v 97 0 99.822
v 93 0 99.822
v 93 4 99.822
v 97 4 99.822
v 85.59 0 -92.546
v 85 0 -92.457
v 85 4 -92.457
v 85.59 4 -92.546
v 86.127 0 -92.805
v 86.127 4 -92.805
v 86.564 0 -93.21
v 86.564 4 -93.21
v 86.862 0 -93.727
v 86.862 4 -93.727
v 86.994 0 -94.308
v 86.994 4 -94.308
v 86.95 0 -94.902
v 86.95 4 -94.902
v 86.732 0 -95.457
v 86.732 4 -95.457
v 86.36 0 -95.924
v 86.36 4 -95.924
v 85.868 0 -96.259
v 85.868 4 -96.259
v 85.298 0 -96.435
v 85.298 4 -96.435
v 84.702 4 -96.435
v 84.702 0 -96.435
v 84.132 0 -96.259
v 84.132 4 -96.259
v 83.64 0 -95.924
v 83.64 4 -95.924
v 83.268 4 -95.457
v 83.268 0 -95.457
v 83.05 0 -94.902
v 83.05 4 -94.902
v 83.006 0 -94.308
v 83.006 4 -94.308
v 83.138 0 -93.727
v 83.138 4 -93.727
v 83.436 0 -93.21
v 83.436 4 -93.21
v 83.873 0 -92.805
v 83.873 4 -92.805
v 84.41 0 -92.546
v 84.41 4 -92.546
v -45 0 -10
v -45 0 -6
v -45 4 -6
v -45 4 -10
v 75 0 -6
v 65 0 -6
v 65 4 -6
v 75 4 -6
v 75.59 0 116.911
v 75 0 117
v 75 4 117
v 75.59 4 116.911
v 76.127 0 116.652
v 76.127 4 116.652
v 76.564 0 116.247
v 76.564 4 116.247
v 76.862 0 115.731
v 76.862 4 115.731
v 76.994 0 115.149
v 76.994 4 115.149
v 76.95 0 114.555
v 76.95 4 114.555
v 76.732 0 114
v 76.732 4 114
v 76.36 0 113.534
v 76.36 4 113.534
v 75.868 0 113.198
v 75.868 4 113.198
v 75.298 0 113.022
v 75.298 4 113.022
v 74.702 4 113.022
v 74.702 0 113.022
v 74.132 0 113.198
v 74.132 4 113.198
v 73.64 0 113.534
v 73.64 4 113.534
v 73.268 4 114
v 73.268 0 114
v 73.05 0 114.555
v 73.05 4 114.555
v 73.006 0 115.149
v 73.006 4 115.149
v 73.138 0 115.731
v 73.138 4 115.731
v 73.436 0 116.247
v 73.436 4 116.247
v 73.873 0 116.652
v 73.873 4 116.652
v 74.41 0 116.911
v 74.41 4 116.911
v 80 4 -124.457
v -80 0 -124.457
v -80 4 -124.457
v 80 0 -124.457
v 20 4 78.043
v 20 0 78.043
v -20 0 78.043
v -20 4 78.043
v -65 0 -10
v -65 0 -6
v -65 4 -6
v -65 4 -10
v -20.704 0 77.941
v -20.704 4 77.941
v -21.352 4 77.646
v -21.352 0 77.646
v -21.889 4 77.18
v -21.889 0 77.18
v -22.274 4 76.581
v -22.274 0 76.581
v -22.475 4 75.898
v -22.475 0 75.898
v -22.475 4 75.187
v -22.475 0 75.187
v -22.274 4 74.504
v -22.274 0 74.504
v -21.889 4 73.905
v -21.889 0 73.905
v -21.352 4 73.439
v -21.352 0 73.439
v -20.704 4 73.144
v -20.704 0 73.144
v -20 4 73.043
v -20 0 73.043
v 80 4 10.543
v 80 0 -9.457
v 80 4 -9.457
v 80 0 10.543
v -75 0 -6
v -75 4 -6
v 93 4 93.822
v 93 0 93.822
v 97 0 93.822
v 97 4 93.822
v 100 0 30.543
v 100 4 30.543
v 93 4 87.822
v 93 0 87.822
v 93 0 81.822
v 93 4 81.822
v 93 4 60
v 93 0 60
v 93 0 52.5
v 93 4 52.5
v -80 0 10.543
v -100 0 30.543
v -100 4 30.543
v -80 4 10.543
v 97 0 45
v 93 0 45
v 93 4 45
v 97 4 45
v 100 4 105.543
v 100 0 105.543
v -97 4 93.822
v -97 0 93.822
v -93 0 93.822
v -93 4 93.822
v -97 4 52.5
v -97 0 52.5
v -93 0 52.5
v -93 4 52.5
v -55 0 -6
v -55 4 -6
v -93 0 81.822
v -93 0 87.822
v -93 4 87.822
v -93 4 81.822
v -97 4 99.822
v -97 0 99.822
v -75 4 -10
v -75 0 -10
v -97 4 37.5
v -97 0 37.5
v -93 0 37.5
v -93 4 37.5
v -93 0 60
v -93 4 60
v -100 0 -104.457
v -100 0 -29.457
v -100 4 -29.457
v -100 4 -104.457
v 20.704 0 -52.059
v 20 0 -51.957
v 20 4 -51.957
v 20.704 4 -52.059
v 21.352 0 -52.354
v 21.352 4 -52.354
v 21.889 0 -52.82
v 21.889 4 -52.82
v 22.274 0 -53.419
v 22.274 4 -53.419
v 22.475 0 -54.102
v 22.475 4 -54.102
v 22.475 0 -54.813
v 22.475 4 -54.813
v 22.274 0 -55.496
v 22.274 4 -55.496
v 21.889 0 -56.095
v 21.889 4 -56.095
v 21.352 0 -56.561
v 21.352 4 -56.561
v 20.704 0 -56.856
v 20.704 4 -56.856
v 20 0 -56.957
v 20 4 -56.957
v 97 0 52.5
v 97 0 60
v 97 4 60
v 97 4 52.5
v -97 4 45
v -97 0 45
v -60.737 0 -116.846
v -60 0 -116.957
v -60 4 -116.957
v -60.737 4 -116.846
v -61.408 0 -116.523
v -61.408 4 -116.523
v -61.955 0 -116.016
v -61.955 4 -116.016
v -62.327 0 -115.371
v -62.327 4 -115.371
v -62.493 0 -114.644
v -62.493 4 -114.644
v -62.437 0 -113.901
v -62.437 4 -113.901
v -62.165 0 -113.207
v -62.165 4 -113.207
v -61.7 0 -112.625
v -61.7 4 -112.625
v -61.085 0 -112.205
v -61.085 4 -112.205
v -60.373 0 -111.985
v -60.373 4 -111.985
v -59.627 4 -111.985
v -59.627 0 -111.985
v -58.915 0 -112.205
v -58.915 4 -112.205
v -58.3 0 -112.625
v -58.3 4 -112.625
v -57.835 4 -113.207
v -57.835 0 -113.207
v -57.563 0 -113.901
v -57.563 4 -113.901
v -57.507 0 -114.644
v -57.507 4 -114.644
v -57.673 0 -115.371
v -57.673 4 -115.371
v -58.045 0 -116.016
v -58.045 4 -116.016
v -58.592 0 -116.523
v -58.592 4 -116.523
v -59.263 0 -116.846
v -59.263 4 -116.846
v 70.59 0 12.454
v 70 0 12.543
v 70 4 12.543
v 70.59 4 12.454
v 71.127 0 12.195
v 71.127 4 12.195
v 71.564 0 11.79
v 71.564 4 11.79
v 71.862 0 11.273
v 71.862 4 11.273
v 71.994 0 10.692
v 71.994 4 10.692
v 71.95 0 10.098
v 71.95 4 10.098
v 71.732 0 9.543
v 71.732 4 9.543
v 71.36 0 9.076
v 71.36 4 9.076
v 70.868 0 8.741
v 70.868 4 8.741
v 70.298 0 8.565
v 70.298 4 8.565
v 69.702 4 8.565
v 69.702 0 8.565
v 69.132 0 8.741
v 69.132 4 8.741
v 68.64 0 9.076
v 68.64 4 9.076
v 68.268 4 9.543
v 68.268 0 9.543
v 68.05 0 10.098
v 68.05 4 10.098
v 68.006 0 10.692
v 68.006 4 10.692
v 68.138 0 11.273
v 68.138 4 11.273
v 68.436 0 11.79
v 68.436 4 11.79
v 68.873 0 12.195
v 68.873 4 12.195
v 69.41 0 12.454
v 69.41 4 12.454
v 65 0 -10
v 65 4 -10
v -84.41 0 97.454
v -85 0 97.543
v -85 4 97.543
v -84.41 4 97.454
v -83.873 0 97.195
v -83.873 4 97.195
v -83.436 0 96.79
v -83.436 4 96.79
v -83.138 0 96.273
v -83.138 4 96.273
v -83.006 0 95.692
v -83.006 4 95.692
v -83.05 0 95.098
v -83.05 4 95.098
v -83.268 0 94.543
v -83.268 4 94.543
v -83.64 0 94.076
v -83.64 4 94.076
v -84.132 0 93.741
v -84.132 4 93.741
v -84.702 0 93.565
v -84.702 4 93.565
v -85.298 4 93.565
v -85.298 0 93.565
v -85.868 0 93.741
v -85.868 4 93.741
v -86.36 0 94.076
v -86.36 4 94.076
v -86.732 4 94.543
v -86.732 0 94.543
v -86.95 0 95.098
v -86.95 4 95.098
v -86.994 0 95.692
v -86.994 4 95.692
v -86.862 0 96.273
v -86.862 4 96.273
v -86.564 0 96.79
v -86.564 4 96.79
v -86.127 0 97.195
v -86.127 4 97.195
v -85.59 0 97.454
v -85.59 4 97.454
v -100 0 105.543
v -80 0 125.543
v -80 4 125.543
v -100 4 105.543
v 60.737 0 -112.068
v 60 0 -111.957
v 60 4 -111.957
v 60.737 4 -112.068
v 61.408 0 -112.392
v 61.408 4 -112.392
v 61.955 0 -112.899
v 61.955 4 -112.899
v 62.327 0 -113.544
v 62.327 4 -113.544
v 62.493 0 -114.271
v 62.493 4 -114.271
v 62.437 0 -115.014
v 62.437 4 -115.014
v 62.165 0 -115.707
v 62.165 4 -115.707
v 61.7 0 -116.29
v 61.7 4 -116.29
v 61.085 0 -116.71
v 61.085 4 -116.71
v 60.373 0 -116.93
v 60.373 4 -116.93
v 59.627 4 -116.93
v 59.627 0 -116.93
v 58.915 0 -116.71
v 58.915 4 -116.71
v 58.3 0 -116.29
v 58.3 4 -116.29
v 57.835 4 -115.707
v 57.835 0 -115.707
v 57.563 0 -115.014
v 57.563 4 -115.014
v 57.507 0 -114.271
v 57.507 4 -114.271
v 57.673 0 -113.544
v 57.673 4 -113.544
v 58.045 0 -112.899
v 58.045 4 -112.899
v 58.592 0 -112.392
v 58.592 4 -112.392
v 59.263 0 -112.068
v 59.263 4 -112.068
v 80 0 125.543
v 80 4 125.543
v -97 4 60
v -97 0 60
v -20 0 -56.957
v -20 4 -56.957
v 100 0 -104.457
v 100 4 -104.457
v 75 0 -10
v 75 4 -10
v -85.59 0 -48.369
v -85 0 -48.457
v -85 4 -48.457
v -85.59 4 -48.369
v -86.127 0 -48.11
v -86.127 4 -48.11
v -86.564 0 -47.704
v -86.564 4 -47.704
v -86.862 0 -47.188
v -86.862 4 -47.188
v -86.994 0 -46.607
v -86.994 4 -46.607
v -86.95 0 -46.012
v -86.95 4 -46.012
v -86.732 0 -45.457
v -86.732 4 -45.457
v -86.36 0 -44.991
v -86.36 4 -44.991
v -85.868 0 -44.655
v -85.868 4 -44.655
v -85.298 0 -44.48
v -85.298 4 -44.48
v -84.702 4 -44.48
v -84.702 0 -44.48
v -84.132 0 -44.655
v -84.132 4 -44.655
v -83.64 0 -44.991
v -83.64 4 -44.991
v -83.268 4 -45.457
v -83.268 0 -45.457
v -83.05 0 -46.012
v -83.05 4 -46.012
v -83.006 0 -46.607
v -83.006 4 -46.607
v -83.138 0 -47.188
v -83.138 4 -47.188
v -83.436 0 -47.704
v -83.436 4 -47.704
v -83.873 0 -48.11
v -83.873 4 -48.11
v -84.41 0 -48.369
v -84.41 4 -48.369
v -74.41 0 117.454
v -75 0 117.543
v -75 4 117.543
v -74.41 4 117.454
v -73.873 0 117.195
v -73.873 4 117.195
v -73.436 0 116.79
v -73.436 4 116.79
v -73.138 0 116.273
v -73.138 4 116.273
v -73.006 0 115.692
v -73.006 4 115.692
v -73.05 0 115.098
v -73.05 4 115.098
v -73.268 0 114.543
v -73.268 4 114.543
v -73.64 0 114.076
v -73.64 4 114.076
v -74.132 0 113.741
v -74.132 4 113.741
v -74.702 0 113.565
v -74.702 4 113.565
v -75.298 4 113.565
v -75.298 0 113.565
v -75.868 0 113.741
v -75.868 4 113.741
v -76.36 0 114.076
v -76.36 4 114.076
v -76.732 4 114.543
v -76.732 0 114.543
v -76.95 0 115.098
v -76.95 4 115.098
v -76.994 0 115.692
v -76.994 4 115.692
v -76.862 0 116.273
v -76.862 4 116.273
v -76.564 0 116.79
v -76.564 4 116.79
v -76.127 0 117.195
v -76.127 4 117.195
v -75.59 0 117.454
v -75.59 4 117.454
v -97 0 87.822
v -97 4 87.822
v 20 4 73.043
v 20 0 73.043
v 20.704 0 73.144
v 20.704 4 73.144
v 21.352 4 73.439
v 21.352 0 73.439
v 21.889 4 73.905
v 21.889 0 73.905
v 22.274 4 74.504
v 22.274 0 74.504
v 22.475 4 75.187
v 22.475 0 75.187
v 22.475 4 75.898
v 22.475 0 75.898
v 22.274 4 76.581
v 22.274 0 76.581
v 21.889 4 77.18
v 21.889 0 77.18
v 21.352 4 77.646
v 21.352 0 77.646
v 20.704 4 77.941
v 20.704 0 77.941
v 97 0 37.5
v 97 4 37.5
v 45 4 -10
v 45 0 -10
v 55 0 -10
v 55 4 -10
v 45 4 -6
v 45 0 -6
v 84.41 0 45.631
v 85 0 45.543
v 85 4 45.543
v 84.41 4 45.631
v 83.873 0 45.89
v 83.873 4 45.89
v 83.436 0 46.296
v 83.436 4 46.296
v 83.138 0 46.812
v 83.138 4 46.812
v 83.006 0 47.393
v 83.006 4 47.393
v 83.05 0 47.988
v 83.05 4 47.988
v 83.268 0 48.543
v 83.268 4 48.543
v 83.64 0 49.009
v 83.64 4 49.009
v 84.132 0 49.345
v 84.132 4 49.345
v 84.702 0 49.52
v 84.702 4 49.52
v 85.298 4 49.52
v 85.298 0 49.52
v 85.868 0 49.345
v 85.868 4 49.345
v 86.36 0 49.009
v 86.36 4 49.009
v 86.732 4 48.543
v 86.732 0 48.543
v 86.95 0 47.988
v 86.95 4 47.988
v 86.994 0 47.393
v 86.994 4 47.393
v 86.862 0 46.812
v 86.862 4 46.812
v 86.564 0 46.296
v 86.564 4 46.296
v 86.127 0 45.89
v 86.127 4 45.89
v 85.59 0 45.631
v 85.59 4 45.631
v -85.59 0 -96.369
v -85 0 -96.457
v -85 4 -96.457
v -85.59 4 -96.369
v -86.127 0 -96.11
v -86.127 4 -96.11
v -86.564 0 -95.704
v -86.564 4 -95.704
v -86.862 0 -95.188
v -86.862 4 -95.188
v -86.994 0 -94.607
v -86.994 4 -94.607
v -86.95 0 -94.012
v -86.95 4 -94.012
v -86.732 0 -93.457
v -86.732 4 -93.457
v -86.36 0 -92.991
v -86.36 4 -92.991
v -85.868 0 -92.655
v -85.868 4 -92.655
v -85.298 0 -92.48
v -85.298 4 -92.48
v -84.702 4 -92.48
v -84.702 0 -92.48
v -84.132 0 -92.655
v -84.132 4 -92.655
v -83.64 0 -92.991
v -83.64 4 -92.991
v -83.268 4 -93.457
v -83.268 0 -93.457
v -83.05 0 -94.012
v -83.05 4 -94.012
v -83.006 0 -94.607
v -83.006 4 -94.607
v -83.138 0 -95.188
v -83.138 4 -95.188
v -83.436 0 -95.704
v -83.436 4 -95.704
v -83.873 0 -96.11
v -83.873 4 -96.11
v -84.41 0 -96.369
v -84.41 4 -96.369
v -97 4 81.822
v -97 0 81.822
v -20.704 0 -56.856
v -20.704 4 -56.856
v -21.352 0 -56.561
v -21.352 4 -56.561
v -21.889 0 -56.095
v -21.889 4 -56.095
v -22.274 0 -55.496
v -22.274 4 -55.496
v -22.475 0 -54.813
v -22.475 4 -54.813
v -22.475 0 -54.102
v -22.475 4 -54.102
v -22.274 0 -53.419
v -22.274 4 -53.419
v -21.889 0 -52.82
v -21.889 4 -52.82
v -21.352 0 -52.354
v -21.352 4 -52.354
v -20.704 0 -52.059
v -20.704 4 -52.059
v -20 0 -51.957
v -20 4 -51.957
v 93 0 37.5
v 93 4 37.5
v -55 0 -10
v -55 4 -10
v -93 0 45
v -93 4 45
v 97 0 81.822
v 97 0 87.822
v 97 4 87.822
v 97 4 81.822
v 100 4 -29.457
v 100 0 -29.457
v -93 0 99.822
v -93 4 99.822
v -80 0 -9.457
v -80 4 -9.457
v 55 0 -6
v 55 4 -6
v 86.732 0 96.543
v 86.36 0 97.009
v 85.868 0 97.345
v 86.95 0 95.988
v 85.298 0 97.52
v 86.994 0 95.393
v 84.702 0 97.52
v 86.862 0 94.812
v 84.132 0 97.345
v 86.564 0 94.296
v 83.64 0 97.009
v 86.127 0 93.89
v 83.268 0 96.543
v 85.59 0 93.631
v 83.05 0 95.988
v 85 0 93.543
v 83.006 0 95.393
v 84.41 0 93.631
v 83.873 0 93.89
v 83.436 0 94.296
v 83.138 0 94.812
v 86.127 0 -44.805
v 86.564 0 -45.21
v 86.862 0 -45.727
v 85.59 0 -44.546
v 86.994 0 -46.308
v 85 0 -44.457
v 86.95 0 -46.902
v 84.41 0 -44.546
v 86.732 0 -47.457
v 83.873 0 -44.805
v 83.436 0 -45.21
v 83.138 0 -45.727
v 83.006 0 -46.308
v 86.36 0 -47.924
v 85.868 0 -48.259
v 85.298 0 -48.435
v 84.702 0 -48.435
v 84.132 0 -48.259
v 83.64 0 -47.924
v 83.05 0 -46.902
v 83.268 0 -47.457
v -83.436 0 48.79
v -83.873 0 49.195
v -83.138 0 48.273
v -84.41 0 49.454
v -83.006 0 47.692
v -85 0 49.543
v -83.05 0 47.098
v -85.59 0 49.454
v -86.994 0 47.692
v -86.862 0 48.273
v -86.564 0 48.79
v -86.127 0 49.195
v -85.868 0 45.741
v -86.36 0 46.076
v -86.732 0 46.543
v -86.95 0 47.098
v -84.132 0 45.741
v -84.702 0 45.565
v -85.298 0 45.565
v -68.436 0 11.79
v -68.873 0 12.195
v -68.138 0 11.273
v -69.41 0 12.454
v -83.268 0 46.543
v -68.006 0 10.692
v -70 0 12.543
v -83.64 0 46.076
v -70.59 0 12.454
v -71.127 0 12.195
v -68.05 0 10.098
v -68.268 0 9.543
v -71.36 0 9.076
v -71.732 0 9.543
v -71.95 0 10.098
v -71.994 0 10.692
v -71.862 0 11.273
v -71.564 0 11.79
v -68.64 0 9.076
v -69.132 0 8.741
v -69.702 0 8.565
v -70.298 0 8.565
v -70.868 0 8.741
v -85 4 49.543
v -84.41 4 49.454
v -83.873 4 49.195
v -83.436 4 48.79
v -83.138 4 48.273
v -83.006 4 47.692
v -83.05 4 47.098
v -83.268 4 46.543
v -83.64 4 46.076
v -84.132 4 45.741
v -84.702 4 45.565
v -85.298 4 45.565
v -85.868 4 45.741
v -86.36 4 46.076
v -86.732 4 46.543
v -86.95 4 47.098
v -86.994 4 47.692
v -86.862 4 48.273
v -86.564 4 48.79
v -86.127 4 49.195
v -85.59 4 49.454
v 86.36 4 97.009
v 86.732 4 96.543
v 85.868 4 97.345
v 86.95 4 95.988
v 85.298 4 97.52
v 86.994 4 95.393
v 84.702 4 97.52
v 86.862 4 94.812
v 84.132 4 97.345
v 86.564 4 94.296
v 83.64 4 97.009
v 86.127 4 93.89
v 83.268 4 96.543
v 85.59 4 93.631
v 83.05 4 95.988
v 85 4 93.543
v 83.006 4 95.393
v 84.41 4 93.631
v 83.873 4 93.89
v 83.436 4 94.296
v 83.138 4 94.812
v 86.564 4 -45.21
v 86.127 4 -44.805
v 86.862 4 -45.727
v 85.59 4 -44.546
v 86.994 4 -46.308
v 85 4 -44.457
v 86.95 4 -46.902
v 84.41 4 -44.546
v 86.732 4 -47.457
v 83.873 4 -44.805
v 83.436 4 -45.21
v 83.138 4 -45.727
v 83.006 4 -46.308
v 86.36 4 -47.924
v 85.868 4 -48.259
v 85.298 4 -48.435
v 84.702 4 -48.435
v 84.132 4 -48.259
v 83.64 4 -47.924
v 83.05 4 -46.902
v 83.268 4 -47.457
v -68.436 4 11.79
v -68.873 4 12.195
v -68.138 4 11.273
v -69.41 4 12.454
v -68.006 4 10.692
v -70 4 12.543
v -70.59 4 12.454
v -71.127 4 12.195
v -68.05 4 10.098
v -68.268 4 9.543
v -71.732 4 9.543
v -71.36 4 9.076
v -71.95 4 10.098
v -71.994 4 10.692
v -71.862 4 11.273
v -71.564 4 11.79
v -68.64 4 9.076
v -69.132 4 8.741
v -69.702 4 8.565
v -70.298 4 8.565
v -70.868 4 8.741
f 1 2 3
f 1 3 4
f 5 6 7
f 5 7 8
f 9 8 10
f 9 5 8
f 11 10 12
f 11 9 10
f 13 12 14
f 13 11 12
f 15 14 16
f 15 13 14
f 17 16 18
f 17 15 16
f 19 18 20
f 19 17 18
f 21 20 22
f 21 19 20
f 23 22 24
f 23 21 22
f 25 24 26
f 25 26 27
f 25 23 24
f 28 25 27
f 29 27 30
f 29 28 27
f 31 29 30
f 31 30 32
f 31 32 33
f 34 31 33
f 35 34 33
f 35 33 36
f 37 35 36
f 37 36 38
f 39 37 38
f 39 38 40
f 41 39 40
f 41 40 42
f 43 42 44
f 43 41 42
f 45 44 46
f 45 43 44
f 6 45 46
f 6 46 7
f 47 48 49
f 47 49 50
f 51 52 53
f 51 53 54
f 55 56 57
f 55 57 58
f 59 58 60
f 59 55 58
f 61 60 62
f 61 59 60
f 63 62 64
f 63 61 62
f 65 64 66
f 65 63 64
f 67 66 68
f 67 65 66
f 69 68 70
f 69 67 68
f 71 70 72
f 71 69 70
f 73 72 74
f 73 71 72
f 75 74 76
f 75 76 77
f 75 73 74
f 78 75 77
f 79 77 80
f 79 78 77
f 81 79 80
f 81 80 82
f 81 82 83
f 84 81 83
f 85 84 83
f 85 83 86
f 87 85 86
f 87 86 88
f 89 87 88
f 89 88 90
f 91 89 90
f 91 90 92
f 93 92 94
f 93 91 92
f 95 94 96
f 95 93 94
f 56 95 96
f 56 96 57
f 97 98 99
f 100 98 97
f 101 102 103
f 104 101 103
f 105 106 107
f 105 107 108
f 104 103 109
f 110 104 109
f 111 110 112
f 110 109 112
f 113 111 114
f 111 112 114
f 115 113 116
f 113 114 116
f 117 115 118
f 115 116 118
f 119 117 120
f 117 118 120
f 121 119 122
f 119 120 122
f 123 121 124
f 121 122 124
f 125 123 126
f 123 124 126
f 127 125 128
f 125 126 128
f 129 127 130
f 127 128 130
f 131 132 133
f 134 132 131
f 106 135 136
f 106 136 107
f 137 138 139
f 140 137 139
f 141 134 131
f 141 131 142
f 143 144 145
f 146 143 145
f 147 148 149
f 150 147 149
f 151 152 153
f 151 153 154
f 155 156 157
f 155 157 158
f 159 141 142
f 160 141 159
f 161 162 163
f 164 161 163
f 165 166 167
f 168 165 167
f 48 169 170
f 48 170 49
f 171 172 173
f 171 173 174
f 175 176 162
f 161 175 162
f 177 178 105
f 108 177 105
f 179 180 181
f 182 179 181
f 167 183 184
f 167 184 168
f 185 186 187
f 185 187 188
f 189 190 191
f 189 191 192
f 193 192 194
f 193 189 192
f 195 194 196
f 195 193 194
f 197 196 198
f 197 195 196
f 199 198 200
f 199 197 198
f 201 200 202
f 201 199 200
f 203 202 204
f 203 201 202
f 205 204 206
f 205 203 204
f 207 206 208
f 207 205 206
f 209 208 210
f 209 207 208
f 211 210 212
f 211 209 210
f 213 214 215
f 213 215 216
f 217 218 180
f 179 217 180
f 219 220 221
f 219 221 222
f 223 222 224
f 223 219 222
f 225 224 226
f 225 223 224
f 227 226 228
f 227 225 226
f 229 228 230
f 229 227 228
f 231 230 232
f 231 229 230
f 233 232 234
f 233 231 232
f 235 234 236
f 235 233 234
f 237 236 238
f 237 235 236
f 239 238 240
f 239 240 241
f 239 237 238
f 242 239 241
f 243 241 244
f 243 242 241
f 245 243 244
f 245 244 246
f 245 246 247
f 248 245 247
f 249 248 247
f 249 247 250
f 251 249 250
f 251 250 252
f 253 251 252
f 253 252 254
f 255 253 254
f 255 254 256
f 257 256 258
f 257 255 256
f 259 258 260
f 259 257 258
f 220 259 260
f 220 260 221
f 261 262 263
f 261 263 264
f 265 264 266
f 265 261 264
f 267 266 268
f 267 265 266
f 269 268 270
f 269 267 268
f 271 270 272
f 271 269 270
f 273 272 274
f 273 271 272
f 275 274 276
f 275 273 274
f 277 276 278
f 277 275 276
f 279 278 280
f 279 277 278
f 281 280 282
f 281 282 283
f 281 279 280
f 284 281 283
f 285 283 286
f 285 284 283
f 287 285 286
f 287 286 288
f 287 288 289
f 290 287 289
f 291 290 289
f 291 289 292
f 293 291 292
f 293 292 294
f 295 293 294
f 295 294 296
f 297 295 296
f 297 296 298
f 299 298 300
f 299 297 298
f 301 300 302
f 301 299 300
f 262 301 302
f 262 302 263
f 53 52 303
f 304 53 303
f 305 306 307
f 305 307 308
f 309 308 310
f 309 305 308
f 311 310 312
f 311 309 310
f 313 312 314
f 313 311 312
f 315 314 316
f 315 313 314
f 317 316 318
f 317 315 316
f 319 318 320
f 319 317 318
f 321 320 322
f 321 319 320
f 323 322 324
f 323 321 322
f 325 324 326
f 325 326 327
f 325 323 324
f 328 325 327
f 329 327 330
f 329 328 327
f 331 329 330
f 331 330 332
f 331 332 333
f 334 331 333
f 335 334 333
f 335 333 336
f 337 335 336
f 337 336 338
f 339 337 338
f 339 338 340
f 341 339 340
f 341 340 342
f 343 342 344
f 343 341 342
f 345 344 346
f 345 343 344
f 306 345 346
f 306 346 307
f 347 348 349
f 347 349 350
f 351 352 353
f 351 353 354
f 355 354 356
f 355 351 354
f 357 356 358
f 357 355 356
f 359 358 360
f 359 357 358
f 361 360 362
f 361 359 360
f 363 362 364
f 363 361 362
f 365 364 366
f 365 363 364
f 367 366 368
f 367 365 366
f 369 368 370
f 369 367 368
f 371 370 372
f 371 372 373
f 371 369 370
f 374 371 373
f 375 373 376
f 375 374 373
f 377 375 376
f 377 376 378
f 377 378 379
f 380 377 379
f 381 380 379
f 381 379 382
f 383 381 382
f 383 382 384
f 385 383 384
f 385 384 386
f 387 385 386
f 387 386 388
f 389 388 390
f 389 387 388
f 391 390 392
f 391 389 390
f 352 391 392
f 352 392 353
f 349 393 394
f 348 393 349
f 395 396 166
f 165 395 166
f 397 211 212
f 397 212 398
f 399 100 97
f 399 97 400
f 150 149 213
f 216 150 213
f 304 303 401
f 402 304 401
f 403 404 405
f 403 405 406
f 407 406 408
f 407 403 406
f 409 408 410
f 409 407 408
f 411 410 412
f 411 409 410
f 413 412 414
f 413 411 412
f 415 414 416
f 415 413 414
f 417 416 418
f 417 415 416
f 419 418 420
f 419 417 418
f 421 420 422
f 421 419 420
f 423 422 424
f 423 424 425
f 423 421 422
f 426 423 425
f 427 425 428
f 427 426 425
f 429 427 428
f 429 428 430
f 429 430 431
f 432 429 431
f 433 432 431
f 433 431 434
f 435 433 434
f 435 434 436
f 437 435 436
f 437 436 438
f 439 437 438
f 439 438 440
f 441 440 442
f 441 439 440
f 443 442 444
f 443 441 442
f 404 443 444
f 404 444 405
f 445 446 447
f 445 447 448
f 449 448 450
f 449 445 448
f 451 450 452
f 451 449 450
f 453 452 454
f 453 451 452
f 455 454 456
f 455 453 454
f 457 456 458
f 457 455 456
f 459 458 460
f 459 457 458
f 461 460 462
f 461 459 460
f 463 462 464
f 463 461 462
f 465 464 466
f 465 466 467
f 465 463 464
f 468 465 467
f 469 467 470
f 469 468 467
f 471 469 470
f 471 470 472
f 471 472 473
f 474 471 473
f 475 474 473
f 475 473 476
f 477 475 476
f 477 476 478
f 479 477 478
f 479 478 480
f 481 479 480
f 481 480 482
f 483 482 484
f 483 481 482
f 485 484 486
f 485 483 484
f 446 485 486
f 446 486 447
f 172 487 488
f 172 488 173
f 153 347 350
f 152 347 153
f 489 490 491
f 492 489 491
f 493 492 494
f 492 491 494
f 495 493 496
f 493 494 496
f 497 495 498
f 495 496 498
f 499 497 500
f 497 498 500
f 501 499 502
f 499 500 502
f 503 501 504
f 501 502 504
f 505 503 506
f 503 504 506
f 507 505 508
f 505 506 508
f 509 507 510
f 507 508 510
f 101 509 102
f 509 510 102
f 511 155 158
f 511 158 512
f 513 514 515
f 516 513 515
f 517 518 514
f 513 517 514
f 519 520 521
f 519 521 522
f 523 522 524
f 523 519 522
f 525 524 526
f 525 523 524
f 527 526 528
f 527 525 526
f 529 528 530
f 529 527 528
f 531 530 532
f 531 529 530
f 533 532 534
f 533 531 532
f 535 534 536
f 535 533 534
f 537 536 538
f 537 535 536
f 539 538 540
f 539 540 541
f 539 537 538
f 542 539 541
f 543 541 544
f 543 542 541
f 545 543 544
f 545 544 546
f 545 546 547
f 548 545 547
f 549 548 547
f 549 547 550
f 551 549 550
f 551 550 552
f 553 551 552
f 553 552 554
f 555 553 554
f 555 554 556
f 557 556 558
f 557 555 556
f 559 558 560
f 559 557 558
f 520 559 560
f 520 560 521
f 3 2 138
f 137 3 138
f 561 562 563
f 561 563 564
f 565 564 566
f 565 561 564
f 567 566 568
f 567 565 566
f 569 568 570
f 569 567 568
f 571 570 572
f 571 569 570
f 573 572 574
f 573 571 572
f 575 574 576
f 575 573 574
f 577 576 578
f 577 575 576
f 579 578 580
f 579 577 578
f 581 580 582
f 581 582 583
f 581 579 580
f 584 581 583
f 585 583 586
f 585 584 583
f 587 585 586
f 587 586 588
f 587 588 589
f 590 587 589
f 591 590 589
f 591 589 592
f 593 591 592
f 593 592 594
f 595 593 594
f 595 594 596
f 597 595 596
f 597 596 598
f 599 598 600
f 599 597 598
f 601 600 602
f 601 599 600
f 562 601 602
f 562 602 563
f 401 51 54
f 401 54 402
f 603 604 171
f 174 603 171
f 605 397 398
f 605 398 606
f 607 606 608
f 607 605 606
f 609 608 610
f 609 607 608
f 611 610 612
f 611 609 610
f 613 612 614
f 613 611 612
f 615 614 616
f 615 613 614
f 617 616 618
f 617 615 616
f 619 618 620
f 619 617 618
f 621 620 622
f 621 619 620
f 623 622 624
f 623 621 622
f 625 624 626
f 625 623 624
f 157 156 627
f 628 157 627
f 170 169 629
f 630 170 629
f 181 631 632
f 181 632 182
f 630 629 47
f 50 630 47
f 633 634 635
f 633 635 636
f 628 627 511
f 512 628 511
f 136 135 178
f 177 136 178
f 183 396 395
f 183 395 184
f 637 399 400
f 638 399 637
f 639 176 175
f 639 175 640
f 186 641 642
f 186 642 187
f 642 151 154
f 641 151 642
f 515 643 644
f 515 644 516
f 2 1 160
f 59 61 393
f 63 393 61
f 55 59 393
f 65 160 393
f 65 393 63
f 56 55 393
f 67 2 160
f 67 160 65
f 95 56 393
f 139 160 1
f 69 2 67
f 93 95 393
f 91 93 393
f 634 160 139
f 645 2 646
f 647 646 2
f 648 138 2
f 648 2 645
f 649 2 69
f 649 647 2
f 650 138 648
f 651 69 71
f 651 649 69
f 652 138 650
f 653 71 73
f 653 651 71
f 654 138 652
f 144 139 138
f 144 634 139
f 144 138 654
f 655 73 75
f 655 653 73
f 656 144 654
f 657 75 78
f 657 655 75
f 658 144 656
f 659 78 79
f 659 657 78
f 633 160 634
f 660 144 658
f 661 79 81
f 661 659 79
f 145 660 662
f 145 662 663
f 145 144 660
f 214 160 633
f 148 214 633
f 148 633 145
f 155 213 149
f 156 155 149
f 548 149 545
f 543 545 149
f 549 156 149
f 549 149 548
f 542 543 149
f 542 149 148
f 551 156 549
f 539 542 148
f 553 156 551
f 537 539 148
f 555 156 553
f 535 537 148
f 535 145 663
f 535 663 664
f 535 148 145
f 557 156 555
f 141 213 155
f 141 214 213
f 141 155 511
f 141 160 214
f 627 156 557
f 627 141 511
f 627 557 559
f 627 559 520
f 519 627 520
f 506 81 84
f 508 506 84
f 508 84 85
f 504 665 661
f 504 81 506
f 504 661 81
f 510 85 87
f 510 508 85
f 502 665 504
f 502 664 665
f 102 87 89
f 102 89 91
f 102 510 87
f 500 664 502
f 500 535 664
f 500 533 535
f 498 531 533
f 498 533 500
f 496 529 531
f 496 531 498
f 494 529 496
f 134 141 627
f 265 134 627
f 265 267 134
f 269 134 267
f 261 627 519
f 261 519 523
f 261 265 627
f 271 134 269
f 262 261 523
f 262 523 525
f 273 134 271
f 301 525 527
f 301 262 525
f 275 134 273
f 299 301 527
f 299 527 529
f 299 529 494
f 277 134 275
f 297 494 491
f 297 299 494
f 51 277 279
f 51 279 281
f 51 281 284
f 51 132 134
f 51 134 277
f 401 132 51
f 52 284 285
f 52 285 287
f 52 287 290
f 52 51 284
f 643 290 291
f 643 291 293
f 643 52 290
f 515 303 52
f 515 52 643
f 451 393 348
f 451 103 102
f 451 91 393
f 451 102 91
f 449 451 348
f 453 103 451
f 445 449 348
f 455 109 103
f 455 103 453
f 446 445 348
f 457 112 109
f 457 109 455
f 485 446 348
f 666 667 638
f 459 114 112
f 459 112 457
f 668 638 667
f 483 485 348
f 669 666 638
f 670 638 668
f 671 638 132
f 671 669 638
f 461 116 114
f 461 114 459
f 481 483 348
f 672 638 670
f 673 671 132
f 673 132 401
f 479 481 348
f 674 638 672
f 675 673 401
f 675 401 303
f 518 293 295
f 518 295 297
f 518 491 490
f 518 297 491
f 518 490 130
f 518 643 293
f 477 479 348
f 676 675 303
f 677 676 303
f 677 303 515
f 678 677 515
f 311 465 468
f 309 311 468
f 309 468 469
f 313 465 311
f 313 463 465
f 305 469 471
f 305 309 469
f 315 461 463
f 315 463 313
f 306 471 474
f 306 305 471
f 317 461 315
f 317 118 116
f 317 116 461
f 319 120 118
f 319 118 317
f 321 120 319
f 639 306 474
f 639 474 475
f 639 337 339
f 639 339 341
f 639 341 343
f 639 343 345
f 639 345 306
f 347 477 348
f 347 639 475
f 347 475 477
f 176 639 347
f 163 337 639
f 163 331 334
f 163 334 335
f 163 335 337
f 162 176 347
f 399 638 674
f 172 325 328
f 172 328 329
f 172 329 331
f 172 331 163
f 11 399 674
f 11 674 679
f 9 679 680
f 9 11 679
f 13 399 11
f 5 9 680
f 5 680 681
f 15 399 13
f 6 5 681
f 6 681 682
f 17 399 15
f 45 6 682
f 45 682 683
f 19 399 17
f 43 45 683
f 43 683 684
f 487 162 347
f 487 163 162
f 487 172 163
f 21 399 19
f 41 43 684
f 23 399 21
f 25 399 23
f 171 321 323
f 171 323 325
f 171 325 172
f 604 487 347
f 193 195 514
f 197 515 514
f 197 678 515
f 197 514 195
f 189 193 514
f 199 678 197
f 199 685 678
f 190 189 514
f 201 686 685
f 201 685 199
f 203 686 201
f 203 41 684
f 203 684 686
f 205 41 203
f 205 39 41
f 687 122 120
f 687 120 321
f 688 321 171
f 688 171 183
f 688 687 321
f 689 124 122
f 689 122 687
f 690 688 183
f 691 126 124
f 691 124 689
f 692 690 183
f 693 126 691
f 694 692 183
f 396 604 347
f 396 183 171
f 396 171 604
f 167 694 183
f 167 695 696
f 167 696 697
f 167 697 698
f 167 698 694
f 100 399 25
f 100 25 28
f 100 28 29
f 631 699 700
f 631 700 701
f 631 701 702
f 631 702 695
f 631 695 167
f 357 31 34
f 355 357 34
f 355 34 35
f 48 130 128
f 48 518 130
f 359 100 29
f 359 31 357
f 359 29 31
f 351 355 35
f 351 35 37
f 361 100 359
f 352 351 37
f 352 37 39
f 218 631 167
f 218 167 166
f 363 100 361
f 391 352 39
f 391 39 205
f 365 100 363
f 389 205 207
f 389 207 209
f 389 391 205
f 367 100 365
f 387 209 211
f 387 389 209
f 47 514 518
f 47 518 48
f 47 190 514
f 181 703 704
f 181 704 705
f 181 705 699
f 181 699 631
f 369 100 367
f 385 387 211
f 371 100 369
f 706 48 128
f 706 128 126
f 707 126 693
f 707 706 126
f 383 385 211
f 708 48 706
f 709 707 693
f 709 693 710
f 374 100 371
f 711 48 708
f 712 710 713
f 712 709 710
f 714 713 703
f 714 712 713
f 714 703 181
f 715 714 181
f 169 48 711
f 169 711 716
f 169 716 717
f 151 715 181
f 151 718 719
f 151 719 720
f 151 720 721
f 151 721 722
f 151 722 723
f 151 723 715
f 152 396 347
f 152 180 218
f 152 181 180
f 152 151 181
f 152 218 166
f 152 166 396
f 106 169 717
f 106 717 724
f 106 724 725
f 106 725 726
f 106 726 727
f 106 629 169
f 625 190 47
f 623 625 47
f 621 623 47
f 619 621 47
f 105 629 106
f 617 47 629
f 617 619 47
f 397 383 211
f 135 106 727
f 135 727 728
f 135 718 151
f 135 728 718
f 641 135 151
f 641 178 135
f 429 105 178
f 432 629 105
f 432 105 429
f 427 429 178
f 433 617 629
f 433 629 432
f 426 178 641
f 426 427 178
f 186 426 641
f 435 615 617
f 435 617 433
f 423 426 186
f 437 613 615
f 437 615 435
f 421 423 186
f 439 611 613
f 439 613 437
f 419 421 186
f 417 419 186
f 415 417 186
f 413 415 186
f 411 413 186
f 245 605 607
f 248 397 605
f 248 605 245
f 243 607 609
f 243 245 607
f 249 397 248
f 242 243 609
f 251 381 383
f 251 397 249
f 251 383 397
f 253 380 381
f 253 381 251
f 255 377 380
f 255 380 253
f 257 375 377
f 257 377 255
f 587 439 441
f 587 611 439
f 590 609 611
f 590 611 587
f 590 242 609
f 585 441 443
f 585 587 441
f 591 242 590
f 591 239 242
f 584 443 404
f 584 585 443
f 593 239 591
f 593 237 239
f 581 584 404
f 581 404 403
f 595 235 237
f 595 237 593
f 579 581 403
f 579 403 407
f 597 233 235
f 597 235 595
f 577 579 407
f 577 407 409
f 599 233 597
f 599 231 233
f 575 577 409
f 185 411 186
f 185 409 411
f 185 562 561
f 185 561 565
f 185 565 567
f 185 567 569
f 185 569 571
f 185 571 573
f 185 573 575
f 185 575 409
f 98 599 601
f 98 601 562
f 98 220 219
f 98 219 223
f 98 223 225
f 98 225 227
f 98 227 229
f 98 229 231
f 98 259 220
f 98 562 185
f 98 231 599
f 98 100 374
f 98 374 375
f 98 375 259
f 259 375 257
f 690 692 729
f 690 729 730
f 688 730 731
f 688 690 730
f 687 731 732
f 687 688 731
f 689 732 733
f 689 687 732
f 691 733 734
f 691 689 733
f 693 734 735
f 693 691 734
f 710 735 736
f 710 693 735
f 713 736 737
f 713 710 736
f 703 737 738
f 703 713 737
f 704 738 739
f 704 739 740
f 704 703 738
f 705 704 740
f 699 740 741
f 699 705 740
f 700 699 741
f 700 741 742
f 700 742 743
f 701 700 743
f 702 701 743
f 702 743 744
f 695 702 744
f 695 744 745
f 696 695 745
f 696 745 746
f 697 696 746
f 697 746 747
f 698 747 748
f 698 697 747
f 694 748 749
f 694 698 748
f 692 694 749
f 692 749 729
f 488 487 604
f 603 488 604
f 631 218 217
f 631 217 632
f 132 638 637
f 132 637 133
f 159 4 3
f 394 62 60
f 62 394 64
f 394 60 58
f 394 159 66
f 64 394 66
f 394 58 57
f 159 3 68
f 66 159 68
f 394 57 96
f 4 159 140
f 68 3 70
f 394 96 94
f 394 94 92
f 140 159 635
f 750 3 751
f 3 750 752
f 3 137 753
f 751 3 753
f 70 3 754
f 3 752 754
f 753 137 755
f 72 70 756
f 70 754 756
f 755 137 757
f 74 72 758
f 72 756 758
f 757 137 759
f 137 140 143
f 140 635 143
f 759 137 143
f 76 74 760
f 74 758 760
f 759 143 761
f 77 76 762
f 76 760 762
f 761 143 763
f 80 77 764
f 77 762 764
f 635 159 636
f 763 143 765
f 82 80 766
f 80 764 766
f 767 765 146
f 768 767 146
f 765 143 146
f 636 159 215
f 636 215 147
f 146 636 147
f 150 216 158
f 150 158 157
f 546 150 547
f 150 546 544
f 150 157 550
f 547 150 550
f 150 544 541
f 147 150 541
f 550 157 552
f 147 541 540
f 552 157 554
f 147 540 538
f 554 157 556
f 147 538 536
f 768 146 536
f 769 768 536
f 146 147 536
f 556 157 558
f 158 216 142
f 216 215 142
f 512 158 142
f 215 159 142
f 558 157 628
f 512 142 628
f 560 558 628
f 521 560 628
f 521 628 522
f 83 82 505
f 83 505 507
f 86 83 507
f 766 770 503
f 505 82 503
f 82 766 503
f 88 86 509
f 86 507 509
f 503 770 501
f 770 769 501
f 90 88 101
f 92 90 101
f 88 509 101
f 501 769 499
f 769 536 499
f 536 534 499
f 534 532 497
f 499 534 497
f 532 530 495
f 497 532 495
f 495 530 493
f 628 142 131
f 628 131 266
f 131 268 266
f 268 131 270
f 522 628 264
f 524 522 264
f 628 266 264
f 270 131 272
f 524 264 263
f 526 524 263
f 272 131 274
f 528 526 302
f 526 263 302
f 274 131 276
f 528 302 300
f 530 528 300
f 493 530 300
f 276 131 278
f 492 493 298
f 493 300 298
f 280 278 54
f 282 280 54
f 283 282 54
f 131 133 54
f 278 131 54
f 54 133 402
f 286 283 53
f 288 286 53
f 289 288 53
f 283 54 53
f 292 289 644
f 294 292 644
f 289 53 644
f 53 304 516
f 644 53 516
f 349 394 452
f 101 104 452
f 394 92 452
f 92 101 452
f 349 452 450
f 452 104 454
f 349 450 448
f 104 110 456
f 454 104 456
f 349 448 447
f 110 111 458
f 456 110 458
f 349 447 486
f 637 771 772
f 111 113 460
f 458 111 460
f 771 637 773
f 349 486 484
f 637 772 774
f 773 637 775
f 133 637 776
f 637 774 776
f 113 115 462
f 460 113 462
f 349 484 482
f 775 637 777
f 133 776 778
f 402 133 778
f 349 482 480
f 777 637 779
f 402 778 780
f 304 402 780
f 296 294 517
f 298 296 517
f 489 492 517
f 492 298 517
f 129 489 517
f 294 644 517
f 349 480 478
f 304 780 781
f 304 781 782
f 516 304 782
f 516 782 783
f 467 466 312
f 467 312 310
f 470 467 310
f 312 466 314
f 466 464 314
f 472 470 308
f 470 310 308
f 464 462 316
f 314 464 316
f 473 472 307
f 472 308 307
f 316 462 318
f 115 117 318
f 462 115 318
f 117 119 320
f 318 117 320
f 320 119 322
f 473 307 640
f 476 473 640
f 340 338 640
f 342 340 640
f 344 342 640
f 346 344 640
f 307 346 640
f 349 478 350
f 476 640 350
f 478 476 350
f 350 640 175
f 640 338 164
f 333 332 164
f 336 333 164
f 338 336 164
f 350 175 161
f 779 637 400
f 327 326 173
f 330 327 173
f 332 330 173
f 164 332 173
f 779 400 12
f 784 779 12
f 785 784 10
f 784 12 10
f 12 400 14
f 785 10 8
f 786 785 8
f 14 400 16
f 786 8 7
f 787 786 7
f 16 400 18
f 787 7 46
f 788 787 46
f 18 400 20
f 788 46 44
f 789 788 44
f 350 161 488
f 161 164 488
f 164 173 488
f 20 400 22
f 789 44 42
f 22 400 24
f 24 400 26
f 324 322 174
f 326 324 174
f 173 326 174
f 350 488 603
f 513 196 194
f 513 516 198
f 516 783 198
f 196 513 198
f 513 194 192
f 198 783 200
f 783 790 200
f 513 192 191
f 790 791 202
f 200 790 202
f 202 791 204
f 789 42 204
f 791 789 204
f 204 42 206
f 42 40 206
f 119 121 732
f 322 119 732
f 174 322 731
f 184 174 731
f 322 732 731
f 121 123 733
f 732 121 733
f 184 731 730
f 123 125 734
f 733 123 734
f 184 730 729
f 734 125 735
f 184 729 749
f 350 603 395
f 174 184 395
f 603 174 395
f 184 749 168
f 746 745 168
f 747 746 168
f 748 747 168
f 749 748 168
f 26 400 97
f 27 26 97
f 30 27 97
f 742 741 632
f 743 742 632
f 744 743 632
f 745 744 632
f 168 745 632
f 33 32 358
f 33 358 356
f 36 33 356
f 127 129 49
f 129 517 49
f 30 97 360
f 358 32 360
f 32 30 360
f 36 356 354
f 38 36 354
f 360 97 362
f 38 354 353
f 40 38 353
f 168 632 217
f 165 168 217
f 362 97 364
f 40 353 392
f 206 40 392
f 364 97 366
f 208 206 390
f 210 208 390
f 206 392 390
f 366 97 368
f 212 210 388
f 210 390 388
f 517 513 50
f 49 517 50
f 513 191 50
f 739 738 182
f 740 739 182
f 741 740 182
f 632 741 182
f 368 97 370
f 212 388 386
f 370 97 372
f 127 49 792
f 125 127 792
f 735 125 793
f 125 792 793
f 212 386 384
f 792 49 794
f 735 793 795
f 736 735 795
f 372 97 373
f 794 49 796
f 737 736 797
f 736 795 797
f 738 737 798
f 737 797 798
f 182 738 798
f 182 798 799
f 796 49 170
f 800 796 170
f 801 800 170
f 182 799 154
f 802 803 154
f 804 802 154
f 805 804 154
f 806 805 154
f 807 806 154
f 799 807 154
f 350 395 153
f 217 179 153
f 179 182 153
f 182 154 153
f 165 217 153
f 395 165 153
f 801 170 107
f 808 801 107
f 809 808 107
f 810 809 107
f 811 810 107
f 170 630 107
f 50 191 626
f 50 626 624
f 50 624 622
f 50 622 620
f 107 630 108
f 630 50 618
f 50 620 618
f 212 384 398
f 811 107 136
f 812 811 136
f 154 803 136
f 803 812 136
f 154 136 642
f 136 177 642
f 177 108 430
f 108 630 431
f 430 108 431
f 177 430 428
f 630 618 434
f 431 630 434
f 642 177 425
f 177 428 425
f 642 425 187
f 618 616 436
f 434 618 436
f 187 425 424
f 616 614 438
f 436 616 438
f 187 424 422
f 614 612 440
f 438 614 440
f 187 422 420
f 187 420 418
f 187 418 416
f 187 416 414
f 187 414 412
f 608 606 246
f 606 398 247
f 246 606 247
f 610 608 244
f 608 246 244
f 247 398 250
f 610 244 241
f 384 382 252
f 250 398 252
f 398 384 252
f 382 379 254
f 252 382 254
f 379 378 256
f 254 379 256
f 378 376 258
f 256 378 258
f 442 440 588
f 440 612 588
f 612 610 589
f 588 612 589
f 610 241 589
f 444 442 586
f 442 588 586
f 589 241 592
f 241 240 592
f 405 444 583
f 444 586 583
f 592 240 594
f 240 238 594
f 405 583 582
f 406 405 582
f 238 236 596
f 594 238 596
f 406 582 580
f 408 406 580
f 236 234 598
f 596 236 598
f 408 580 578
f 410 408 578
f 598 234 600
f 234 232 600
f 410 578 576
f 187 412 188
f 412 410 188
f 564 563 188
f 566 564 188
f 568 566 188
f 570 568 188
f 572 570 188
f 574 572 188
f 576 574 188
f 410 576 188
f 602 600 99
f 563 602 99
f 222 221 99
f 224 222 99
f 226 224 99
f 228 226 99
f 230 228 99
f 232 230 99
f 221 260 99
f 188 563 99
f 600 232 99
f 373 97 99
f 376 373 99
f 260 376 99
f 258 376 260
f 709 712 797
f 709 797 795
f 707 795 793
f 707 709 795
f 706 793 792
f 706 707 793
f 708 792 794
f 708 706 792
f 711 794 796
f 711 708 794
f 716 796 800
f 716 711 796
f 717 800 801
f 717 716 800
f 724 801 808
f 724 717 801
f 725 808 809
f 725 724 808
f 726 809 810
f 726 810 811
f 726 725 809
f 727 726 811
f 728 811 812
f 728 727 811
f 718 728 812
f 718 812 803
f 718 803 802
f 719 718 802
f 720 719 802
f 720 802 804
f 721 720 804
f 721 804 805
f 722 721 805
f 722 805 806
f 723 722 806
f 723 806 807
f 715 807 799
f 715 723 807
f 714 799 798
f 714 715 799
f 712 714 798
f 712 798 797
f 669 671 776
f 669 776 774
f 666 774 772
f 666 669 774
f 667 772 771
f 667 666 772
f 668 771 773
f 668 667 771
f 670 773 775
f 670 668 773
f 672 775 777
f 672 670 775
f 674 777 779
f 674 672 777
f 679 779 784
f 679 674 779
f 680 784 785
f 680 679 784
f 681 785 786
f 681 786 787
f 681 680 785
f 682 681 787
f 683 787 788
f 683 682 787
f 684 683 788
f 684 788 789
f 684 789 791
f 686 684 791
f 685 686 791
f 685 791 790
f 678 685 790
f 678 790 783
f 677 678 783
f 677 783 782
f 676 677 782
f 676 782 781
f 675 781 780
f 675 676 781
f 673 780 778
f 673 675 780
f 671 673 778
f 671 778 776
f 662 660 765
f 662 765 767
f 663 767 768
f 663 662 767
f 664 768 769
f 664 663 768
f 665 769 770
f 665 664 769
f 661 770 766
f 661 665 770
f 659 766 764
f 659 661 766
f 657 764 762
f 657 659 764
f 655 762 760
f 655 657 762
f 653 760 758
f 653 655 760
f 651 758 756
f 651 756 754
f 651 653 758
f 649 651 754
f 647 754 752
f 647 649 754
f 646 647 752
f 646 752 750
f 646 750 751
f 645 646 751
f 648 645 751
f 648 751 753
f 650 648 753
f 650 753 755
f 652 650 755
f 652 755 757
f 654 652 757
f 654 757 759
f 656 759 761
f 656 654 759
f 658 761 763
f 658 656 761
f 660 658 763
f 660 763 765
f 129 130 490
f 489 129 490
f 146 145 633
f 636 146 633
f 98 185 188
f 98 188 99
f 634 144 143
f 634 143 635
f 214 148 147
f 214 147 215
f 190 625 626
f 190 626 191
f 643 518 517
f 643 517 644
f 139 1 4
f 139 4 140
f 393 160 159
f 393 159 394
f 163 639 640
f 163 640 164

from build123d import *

# Parameters (mm, degrees)
SKETCH1_R           = 2
SKETCH1_R_2         = 2.5
SKETCH1_W           = 4
SKETCH1_H           = 7.5
SKETCH1_H_2         = 6
SKETCH1_W_2         = 10
SKETCH1_H_3         = 4
BOSS_EXTRUDE1_DEPTH = 4


with BuildPart() as part:
    # Sketch1 → Boss-Extrude1 (new body)
    with BuildSketch(Plane(origin=(0, 0, 0), x_dir=(1, 0, 0), z_dir=(0, 1, 0))):
        Polygon((-80, -10.54257408), (-80, 9.45742592), (-100, 29.45742592), (-100, 104.45742592), (-80, 124.45742592), (80, 124.45742592), (100, 104.45742592), (100, 29.45742592), (80, 9.45742592), (80, -10.54257408), (100, -30.54257408), (100, -105.54257408), (80, -125.54257408), (-80, -125.54257408), (-100, -105.54257408), (-100, -30.54257408), align=None)
        with Locations(Location((85, 94.45742592, 0), (0, 0, 270))):
            Circle(SKETCH1_R, mode=Mode.SUBTRACT)
        with Locations(Location((85, 46.45742592, 0), (0, 0, 270))):
            Circle(SKETCH1_R, mode=Mode.SUBTRACT)
        with Locations(Location((85, -95.54257408, 0), (0, 0, 90))):
            Circle(SKETCH1_R, mode=Mode.SUBTRACT)
        with Locations(Location((85, -47.54257408, 0), (0, 0, 90))):
            Circle(SKETCH1_R, mode=Mode.SUBTRACT)
        with Locations(Location((-85, 94.45742592, 0), (0, 0, 90))):
            Circle(SKETCH1_R, mode=Mode.SUBTRACT)
        with Locations(Location((-85, 46.45742592, 0), (0, 0, 90))):
            Circle(SKETCH1_R, mode=Mode.SUBTRACT)
        with Locations(Location((-85, -47.54257408, 0), (0, 0, 270))):
            Circle(SKETCH1_R, mode=Mode.SUBTRACT)
        with Locations(Location((-85, -95.54257408, 0), (0, 0, 270))):
            Circle(SKETCH1_R, mode=Mode.SUBTRACT)
        with Locations(Location((60, 114.45742592, 0), (0, 0, 270))):
            Circle(SKETCH1_R_2, mode=Mode.SUBTRACT)
        with Locations(Location((-60, 114.45742592, 0), (0, 0, 90))):
            Circle(SKETCH1_R_2, mode=Mode.SUBTRACT)
        with Locations(Location((-75, -115.54257408, 0), (0, 0, 270))):
            Circle(SKETCH1_R, mode=Mode.SUBTRACT)
        with Locations(Location((-70, -10.54257408, 0), (0, 0, 270))):
            Circle(SKETCH1_R, mode=Mode.SUBTRACT)
        with Locations(Location((75, -115, 0), (0, 0, 270))):
            Circle(SKETCH1_R, mode=Mode.SUBTRACT)
        with Locations(Location((70, -10.54257408, 0), (0, 0, 270))):
            Circle(SKETCH1_R, mode=Mode.SUBTRACT)
        with BuildLine():
            Line((20, -78.04257408), (-20, -78.04257408))
            ThreePointArc((-20, -78.04257408), (-22.5, -75.54257408), (-20, -73.04257408))
            Line((-20, -73.04257408), (20, -73.04257408))
            ThreePointArc((20, -73.04257408), (22.5, -75.54257408), (20, -78.04257408))
        make_face(mode=Mode.SUBTRACT)
        with BuildLine():
            Line((20, 56.95742592), (-20, 56.95742592))
            ThreePointArc((-20, 56.95742592), (-22.5, 54.45742592), (-20, 51.95742592))
            Line((-20, 51.95742592), (20, 51.95742592))
            ThreePointArc((20, 51.95742592), (22.5, 54.45742592), (20, 56.95742592))
        make_face(mode=Mode.SUBTRACT)
        with Locations((95, -41.25)):
            Rectangle(SKETCH1_W, SKETCH1_H, mode=Mode.SUBTRACT)
        with Locations((95, -96.822248533)):
            Rectangle(SKETCH1_W, SKETCH1_H_2, mode=Mode.SUBTRACT)
        with Locations((70, 8)):
            Rectangle(SKETCH1_W_2, SKETCH1_H_3, mode=Mode.SUBTRACT)
        with Locations((95, -56.25)):
            Rectangle(SKETCH1_W, SKETCH1_H, mode=Mode.SUBTRACT)
        with Locations((50, 8)):
            Rectangle(SKETCH1_W_2, SKETCH1_H_3, mode=Mode.SUBTRACT)
        with Locations((95, -84.822248533)):
            Rectangle(SKETCH1_W, SKETCH1_H_2, mode=Mode.SUBTRACT)
        with Locations((-95, -96.822248533)):
            Rectangle(SKETCH1_W, SKETCH1_H_2, mode=Mode.SUBTRACT)
        with Locations((-95, -84.822248533)):
            Rectangle(SKETCH1_W, SKETCH1_H_2, mode=Mode.SUBTRACT)
        with Locations((-95, -56.25)):
            Rectangle(SKETCH1_W, SKETCH1_H, mode=Mode.SUBTRACT)
        with Locations((-95, -41.25)):
            Rectangle(SKETCH1_W, SKETCH1_H, mode=Mode.SUBTRACT)
        with Locations((-50, 8)):
            Rectangle(SKETCH1_W_2, SKETCH1_H_3, mode=Mode.SUBTRACT)
        with Locations((-70, 8)):
            Rectangle(SKETCH1_W_2, SKETCH1_H_3, mode=Mode.SUBTRACT)
    extrude(amount=BOSS_EXTRUDE1_DEPTH)


solid = part.part
